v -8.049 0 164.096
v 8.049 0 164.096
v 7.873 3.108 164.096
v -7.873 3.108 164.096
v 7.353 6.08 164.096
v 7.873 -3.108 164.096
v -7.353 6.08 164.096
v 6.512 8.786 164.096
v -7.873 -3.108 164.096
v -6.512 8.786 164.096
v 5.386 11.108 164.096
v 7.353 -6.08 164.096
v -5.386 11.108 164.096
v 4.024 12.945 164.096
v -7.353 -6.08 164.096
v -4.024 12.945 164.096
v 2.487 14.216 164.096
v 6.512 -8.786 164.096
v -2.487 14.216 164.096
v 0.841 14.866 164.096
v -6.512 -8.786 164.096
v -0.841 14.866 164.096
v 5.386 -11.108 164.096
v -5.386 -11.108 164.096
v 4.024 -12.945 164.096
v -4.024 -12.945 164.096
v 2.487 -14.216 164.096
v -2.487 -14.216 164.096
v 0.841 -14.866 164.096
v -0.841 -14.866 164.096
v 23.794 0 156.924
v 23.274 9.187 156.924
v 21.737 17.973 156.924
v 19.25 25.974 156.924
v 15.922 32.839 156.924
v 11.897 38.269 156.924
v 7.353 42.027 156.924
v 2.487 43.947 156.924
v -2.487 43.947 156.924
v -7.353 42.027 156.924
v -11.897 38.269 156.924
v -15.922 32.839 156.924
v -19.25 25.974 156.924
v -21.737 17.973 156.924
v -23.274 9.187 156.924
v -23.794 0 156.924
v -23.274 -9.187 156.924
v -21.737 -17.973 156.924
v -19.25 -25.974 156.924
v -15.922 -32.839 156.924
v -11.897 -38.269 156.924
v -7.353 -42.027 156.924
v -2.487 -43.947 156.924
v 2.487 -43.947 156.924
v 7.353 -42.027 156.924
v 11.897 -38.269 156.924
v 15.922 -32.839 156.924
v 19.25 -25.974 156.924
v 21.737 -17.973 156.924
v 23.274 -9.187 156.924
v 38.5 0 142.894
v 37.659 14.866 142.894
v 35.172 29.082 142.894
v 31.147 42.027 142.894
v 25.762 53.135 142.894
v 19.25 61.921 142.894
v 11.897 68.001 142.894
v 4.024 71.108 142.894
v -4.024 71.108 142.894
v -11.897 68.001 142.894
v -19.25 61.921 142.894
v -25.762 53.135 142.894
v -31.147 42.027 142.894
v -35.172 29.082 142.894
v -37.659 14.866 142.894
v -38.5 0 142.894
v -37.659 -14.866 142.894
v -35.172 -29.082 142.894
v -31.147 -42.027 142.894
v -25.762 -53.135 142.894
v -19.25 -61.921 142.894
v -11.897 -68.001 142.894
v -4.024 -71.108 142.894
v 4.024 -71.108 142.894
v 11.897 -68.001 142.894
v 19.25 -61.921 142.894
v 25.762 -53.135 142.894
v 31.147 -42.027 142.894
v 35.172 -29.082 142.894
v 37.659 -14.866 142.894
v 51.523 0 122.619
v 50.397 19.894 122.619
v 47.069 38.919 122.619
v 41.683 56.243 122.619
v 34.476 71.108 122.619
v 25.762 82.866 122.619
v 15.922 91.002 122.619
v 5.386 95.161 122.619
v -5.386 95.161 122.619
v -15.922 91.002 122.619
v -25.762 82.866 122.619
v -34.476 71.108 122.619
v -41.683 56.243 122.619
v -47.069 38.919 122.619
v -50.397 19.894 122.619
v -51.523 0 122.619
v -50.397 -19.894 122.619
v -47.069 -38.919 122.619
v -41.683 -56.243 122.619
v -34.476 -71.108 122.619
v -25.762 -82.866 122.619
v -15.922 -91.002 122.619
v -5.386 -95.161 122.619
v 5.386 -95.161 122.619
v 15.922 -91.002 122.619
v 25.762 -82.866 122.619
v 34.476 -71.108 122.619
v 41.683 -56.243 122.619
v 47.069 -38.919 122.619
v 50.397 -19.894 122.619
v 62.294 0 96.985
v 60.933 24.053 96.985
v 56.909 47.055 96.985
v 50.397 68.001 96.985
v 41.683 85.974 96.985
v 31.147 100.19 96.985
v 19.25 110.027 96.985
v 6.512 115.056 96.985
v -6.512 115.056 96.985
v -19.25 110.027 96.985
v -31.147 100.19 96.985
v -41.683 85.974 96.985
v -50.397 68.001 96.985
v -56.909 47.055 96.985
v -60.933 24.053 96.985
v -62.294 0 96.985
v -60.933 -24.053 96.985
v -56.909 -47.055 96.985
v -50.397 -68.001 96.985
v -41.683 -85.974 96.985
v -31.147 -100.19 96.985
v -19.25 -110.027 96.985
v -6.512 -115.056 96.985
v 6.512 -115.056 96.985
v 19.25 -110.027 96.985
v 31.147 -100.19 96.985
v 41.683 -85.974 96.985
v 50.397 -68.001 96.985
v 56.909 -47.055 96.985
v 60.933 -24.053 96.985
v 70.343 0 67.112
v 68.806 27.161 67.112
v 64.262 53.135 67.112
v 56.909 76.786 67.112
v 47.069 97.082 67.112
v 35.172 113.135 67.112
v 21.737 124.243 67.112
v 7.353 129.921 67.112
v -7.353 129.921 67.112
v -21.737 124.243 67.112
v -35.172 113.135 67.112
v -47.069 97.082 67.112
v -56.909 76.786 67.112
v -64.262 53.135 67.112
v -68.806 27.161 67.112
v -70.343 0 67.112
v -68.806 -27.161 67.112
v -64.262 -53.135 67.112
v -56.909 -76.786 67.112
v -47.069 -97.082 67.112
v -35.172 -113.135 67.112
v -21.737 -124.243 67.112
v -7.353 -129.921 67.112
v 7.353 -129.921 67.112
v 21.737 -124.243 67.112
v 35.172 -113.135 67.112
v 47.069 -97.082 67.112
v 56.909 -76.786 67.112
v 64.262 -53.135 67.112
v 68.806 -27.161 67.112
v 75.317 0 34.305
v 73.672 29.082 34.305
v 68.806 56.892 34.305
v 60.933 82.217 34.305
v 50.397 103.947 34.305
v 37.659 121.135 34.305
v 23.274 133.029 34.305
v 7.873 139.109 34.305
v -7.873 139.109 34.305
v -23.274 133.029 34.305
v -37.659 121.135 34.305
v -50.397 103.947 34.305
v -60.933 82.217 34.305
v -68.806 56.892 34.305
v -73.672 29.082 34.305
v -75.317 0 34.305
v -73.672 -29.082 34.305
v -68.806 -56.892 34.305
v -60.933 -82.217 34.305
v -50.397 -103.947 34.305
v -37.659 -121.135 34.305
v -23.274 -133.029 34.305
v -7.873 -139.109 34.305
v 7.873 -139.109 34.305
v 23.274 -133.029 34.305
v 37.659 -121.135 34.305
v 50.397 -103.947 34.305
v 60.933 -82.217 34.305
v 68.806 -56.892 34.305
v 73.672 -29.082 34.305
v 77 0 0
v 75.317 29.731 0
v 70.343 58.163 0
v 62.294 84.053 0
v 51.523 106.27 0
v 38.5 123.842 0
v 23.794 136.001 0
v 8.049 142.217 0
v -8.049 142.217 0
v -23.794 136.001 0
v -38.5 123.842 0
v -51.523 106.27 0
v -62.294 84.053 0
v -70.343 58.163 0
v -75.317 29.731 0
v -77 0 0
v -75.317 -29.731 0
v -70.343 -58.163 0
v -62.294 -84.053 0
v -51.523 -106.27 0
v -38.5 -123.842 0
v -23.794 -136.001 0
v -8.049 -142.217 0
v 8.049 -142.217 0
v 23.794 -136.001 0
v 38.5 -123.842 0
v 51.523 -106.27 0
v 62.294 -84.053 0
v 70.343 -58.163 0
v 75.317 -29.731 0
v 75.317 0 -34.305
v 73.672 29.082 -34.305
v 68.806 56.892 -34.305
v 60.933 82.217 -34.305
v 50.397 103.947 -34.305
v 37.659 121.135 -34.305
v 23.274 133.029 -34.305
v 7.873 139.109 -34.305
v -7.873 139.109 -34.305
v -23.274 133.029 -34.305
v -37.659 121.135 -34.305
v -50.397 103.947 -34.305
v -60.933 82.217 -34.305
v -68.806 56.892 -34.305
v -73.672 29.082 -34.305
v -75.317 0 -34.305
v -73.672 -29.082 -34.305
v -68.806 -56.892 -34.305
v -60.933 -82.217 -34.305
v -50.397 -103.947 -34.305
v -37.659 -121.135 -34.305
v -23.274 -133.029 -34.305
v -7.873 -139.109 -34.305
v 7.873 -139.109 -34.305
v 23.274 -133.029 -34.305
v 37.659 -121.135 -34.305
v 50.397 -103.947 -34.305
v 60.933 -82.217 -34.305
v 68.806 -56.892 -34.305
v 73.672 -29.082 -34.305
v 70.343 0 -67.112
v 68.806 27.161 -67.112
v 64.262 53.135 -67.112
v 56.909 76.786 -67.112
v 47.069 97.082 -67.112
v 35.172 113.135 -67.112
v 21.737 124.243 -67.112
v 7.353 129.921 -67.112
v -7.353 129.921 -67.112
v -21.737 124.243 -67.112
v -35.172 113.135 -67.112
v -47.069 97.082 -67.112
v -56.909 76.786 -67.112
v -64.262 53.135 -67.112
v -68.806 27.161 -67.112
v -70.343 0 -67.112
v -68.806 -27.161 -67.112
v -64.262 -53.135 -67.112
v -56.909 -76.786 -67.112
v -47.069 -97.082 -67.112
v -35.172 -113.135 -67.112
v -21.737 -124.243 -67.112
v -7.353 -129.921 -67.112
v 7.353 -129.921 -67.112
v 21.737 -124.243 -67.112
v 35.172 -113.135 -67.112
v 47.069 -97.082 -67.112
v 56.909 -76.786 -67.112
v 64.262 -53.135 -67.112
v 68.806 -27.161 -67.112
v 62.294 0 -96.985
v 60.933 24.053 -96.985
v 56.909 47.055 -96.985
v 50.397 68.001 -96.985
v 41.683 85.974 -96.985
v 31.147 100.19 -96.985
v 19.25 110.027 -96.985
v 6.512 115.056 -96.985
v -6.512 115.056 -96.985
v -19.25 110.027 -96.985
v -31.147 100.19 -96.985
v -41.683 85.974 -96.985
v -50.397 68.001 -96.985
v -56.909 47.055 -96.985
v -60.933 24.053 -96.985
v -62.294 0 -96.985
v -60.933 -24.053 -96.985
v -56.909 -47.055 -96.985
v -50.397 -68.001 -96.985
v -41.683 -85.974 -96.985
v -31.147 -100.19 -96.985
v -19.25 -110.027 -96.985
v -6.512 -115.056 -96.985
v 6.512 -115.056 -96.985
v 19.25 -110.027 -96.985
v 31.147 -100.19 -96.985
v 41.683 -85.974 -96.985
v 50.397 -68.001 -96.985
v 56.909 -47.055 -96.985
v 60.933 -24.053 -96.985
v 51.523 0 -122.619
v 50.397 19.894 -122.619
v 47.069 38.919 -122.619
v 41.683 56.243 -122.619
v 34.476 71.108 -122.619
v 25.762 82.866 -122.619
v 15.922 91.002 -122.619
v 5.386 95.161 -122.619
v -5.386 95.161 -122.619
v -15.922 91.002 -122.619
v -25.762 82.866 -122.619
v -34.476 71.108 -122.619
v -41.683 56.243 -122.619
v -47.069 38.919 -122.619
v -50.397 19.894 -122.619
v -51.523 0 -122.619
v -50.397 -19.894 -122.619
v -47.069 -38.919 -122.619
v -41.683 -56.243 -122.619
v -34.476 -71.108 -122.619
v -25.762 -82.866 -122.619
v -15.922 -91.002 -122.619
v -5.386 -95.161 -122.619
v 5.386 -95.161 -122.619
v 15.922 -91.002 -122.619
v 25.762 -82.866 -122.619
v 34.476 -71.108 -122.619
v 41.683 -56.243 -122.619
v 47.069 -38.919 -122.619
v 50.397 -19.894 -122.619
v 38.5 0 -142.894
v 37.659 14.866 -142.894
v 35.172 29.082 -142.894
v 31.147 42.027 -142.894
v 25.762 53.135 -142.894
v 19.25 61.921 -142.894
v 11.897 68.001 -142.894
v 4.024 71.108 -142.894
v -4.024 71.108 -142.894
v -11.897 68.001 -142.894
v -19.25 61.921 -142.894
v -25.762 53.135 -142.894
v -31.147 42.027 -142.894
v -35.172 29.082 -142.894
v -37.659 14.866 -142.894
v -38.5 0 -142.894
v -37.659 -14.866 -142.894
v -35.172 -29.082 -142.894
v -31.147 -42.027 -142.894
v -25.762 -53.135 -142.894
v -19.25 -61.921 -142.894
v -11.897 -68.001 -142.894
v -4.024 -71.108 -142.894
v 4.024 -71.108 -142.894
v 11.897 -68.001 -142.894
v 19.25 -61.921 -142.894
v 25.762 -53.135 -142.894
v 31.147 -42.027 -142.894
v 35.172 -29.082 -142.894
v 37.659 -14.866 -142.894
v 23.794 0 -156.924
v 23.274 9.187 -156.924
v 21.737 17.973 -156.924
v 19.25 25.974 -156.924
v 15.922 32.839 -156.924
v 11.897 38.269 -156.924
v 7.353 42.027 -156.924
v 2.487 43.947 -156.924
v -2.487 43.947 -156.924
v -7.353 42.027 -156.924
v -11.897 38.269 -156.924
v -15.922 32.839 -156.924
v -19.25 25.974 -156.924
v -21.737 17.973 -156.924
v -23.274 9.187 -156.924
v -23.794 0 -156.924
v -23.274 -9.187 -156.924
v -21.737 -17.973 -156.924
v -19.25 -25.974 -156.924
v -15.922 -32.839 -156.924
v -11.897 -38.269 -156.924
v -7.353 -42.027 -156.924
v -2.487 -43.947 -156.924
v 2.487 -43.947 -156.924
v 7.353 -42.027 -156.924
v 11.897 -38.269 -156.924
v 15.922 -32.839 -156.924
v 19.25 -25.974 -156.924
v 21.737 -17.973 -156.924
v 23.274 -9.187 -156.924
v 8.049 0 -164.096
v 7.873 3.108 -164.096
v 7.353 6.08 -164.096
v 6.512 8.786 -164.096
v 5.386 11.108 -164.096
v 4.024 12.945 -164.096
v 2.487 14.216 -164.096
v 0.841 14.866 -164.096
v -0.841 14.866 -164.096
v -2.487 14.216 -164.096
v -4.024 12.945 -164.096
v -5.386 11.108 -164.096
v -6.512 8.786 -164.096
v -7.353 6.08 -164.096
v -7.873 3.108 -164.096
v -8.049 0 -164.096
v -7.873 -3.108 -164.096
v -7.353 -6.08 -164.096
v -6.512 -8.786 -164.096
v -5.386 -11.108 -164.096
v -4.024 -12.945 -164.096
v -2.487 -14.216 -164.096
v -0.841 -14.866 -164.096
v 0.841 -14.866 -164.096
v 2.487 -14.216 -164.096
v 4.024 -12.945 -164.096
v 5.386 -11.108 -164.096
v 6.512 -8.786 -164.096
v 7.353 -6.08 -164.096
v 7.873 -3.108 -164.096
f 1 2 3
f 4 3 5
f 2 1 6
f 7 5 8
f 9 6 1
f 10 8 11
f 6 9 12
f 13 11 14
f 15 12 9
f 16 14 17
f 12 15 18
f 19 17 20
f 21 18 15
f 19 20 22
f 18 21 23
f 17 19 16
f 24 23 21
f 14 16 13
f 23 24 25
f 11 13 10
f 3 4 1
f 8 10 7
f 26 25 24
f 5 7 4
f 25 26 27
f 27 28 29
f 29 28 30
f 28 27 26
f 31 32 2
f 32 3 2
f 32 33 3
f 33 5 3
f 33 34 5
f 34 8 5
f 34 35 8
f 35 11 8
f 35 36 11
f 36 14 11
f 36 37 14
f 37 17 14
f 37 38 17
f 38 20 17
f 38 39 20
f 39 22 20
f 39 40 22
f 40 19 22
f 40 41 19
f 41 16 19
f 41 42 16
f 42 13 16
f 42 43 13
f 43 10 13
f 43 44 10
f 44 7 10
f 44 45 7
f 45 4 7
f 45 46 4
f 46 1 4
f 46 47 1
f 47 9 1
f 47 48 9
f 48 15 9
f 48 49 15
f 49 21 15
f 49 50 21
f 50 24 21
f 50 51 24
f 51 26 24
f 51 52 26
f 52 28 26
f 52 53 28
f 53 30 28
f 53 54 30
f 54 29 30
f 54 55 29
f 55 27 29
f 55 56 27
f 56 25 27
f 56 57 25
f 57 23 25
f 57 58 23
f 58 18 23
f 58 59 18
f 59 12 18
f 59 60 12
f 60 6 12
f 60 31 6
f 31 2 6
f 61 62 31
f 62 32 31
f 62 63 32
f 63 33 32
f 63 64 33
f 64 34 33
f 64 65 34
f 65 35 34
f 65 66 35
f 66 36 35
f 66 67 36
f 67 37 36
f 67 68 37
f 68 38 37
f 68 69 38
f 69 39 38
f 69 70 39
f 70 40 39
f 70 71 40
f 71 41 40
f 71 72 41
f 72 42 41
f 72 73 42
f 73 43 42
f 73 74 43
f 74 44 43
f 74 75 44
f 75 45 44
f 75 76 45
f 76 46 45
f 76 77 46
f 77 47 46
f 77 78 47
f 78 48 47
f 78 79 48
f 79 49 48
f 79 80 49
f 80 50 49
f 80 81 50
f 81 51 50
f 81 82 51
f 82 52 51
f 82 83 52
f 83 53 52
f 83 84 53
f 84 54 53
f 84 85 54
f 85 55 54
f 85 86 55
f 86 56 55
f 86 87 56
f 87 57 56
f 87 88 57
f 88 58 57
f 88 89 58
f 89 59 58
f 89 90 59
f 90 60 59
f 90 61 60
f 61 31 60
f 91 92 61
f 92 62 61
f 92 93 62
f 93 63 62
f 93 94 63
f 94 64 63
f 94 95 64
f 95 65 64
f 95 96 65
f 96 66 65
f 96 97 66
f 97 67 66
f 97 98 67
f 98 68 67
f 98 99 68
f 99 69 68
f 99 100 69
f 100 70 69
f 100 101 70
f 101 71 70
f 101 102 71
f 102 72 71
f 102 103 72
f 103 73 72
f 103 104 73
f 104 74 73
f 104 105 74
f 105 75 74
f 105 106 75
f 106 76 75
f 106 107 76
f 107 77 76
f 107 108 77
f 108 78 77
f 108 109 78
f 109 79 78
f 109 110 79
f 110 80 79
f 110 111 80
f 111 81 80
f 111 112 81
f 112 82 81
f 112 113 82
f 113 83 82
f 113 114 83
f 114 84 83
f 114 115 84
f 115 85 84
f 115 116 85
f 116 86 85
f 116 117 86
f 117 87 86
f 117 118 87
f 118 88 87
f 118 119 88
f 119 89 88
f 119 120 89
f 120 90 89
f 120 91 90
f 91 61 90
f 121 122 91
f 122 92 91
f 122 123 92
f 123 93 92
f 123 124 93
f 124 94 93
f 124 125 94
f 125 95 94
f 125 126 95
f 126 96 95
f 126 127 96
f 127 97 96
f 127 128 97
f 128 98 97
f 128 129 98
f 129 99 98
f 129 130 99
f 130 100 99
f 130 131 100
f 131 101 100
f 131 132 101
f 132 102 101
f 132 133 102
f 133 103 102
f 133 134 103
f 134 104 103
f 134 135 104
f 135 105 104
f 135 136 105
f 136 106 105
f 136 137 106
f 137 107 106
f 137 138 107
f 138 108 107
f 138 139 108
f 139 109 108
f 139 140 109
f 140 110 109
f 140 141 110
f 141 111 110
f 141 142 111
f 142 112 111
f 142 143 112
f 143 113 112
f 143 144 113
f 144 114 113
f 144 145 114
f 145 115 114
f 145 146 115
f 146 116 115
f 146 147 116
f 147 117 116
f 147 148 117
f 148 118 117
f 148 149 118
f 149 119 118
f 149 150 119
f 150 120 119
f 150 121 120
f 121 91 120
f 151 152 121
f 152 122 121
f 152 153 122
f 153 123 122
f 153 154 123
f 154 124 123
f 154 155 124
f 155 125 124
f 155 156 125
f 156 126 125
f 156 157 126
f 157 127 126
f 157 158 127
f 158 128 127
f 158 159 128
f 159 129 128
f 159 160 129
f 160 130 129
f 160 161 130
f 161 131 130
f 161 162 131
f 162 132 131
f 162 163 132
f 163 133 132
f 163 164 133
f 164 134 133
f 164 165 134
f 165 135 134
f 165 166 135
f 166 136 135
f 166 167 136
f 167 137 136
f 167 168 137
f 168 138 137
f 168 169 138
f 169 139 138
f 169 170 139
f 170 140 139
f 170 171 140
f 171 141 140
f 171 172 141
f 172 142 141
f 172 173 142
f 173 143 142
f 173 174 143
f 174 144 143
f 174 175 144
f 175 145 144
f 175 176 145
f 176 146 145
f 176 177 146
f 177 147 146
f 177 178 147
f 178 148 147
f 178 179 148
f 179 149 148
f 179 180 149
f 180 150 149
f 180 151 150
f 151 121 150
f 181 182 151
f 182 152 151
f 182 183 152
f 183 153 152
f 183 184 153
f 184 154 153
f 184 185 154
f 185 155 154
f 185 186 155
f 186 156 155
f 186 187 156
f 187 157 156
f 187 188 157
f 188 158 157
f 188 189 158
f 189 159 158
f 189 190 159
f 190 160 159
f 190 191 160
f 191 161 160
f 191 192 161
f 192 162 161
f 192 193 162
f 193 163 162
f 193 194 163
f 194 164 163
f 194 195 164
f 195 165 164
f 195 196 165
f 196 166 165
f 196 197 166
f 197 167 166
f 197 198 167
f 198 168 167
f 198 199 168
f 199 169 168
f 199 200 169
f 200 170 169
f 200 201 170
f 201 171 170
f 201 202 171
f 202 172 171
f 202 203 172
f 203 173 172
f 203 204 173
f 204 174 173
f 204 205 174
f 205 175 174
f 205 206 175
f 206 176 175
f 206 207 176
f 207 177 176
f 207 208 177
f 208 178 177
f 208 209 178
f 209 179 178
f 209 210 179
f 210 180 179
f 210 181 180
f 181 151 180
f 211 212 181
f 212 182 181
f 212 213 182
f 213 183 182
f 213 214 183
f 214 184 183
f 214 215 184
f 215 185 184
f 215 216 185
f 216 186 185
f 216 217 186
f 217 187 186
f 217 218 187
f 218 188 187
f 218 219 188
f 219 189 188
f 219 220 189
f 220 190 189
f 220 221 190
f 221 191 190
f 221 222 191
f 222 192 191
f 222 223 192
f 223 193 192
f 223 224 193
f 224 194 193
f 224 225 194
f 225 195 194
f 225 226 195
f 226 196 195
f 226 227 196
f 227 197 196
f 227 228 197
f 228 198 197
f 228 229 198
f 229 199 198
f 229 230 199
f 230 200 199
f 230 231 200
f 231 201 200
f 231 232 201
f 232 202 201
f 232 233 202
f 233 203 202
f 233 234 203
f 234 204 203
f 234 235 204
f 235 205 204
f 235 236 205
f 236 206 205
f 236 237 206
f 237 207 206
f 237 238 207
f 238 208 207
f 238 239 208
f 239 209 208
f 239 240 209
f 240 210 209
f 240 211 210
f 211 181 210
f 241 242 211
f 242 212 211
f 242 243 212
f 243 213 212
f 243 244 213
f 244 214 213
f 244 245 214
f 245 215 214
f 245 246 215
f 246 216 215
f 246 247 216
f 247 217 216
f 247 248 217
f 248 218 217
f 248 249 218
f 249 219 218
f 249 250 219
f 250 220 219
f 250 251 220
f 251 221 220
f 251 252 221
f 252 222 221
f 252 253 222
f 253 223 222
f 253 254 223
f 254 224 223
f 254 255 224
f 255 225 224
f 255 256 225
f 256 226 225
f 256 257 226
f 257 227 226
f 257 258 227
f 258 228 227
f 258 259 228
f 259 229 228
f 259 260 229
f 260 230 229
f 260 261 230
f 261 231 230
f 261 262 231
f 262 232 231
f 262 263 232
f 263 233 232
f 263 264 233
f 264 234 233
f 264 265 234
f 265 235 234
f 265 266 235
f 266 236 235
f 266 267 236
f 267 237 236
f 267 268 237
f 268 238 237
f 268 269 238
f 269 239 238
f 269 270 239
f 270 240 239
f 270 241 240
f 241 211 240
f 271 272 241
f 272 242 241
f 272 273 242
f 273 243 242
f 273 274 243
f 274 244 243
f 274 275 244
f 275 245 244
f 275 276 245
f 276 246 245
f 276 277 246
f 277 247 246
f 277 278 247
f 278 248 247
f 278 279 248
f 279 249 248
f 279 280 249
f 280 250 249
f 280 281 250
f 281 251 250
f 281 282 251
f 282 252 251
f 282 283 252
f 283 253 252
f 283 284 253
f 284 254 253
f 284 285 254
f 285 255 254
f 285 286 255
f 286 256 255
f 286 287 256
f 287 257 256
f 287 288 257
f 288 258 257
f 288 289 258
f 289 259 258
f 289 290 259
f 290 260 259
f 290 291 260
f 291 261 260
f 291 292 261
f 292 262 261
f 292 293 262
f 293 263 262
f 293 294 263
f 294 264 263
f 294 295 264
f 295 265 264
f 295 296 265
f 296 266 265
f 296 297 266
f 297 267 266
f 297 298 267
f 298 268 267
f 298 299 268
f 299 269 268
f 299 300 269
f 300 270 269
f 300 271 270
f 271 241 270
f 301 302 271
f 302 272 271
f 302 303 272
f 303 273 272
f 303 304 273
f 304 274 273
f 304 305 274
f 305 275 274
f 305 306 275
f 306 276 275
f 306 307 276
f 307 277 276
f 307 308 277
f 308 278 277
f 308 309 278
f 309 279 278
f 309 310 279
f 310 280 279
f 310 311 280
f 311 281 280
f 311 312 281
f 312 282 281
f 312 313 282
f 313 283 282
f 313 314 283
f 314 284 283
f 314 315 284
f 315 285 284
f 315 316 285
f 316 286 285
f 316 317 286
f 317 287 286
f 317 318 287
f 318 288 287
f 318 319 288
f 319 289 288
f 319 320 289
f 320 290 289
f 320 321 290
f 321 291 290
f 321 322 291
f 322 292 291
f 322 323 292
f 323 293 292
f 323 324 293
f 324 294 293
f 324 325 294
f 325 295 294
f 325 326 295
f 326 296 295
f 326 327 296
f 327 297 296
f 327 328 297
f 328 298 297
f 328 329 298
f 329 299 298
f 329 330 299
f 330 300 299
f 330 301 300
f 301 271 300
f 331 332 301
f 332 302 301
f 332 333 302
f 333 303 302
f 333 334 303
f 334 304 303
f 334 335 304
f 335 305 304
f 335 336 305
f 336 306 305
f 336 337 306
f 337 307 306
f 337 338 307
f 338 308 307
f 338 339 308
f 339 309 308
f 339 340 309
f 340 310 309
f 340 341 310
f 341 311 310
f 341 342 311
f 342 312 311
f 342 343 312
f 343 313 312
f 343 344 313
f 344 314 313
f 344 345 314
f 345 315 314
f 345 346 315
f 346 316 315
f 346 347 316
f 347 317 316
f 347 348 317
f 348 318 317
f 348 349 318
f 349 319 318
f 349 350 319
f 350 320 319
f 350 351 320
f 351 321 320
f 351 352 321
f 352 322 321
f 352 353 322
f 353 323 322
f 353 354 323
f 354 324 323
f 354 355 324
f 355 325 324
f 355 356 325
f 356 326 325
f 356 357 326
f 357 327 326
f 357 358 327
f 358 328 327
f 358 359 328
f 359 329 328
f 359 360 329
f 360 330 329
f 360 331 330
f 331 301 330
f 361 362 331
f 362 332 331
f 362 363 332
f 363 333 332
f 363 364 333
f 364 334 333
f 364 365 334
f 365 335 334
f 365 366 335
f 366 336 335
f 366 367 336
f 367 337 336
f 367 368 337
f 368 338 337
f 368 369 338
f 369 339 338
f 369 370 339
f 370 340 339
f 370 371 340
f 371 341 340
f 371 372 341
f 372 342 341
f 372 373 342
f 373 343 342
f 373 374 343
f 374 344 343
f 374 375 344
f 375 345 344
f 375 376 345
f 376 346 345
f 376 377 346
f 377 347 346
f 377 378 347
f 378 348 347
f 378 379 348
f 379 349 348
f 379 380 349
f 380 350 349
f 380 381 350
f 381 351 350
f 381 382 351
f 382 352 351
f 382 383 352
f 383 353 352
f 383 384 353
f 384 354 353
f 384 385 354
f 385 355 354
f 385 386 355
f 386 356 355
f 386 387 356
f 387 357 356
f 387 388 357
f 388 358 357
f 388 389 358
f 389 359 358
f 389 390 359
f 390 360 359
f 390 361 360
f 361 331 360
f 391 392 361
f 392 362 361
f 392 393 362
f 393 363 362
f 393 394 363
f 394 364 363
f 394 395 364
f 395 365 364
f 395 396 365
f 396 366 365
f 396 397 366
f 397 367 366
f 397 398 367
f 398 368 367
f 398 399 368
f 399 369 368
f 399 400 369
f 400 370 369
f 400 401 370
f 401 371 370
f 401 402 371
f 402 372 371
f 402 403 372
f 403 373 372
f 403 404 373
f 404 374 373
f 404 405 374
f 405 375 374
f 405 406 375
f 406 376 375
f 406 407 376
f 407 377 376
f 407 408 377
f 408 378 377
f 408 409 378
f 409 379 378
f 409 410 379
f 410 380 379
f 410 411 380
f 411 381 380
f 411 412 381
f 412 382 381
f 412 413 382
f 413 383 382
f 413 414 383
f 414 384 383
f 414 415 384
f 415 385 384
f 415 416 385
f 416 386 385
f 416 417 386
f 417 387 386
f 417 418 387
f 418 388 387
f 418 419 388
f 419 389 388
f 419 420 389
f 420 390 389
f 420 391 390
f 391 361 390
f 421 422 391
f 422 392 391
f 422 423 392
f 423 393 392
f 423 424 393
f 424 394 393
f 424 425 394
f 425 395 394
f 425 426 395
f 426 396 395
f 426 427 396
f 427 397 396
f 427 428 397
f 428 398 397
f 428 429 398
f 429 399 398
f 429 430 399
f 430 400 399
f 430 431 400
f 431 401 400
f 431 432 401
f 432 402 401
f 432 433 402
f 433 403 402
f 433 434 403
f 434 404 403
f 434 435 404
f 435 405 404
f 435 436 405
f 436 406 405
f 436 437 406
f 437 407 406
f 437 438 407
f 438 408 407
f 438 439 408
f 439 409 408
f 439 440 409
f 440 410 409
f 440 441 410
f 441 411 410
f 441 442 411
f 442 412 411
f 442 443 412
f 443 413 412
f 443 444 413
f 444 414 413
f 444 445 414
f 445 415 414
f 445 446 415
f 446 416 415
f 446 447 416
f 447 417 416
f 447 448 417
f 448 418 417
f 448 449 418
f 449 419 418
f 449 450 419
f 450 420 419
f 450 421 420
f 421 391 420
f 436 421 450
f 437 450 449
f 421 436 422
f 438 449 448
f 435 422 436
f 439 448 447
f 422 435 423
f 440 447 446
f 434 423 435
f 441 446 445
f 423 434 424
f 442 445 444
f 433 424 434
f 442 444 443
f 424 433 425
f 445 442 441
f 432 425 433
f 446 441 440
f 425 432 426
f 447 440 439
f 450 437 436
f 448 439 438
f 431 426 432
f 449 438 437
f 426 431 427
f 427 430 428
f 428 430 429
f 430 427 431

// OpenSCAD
// Generated by SolidPython 1.0.1 on 2020-07-29 00:46:47


scale(v = [7, 13, 15]) {
	sphere(r = 11);
}
/***********************************************
*********      SolidPython code:      **********
************************************************
 
# import packages: SolidPython
from solid import *
from solid.utils import *
from itertools import chain, combinations, permutations


class Resize:

    def __init__(self, scad_file):
        self.scad_file = scad_file
        #self.scad_file = import_scad(scad_file)
        # cone/cylinder param:
        self.r1 = 0
        self.r2 = 0
        self.h = 0
        # rectangular prism param:
        self.w = 0
        self.l = 0
        # ellipse param:
        self.r = 0

    # import OpenScad code (file name corresponds to shape)


    # classify shape + parameters
    def assign(self, param1, param2, param3):
        if self.scad_file == 'cone.scad':
            self.r1 = param1
            self.r2 = param2
            self.h = param3
        elif self.scad_file == 'cylinder.scad':
            self.r1 = param1
            self.r2 = param2
            self.h = param3
        elif self.scad_file == 'rectangularPrism.scad':
            self.h = param1
            self.l = param2
            self.w = param3
        else:
            self.r = param1
            self.h = param2

    # resize parameters
    def iterate(self):
        x = range(3, 20, 2)
        i = 1
        if self.scad_file == 'cone.scad':
            tempList = list(permutations(x, 2))
            for temp in tempList:
                param1 = temp[0]
                param2 = temp[1]
                filepath = 'produced_scad_files/' + 'cone' + str(param1) + '_' + str(param2) + '_' + '.scad'
                scad_render_to_file(cylinder(h=param1, r1=param2, r2=0), filepath)

        elif self.scad_file == 'cylinder.scad':
            tempList = list(permutations(x, 3))
            for temp in tempList:
                param1 = temp[0]
                param2 = temp[1]
                filepath = 'produced_scad_files/' + 'cylinder' + str(param1) + '_' + str(param2) + '_' + '.scad'
                scad_render_to_file(cylinder(h=param1, r1=param2, r2=param2), filepath)

        elif self.scad_file == 'rectangularPrism.scad':
            tempList = list(permutations(x, 3))
            for temp in tempList:
                param1 = temp[0]
                param2 = temp[1]
                param3 = temp[2]
                filepath = 'produced_scad_files/' + 'rectangularPrism' + str(param1) + '_' + str(param2) + '_' + str(
                    param3) + '.scad'
                scad_render_to_file(cube(size=(param1, param2, param3)), filepath)

        elif self.scad_file == 'ellipse.scad':
            tempList = list(permutations(x, 4))
            for temp in tempList:
                param1 = temp[0]
                param2 = temp[1]
                param3 = temp[2]
                param4 = temp[3]
                filepath = 'produced_scad_files/' + 'ellipse' + str(param1) + '_' + str(param2) + '_' + str(param3) + '_' + str(param4) + '.scad'
                scad_render_to_file(scale([param1, param2, param3])(sphere(r=param4)), filepath)

    def render_to_scadfile(self):
        scad_render_to_file(scad, 'example.scad') 
 
************************************************/
